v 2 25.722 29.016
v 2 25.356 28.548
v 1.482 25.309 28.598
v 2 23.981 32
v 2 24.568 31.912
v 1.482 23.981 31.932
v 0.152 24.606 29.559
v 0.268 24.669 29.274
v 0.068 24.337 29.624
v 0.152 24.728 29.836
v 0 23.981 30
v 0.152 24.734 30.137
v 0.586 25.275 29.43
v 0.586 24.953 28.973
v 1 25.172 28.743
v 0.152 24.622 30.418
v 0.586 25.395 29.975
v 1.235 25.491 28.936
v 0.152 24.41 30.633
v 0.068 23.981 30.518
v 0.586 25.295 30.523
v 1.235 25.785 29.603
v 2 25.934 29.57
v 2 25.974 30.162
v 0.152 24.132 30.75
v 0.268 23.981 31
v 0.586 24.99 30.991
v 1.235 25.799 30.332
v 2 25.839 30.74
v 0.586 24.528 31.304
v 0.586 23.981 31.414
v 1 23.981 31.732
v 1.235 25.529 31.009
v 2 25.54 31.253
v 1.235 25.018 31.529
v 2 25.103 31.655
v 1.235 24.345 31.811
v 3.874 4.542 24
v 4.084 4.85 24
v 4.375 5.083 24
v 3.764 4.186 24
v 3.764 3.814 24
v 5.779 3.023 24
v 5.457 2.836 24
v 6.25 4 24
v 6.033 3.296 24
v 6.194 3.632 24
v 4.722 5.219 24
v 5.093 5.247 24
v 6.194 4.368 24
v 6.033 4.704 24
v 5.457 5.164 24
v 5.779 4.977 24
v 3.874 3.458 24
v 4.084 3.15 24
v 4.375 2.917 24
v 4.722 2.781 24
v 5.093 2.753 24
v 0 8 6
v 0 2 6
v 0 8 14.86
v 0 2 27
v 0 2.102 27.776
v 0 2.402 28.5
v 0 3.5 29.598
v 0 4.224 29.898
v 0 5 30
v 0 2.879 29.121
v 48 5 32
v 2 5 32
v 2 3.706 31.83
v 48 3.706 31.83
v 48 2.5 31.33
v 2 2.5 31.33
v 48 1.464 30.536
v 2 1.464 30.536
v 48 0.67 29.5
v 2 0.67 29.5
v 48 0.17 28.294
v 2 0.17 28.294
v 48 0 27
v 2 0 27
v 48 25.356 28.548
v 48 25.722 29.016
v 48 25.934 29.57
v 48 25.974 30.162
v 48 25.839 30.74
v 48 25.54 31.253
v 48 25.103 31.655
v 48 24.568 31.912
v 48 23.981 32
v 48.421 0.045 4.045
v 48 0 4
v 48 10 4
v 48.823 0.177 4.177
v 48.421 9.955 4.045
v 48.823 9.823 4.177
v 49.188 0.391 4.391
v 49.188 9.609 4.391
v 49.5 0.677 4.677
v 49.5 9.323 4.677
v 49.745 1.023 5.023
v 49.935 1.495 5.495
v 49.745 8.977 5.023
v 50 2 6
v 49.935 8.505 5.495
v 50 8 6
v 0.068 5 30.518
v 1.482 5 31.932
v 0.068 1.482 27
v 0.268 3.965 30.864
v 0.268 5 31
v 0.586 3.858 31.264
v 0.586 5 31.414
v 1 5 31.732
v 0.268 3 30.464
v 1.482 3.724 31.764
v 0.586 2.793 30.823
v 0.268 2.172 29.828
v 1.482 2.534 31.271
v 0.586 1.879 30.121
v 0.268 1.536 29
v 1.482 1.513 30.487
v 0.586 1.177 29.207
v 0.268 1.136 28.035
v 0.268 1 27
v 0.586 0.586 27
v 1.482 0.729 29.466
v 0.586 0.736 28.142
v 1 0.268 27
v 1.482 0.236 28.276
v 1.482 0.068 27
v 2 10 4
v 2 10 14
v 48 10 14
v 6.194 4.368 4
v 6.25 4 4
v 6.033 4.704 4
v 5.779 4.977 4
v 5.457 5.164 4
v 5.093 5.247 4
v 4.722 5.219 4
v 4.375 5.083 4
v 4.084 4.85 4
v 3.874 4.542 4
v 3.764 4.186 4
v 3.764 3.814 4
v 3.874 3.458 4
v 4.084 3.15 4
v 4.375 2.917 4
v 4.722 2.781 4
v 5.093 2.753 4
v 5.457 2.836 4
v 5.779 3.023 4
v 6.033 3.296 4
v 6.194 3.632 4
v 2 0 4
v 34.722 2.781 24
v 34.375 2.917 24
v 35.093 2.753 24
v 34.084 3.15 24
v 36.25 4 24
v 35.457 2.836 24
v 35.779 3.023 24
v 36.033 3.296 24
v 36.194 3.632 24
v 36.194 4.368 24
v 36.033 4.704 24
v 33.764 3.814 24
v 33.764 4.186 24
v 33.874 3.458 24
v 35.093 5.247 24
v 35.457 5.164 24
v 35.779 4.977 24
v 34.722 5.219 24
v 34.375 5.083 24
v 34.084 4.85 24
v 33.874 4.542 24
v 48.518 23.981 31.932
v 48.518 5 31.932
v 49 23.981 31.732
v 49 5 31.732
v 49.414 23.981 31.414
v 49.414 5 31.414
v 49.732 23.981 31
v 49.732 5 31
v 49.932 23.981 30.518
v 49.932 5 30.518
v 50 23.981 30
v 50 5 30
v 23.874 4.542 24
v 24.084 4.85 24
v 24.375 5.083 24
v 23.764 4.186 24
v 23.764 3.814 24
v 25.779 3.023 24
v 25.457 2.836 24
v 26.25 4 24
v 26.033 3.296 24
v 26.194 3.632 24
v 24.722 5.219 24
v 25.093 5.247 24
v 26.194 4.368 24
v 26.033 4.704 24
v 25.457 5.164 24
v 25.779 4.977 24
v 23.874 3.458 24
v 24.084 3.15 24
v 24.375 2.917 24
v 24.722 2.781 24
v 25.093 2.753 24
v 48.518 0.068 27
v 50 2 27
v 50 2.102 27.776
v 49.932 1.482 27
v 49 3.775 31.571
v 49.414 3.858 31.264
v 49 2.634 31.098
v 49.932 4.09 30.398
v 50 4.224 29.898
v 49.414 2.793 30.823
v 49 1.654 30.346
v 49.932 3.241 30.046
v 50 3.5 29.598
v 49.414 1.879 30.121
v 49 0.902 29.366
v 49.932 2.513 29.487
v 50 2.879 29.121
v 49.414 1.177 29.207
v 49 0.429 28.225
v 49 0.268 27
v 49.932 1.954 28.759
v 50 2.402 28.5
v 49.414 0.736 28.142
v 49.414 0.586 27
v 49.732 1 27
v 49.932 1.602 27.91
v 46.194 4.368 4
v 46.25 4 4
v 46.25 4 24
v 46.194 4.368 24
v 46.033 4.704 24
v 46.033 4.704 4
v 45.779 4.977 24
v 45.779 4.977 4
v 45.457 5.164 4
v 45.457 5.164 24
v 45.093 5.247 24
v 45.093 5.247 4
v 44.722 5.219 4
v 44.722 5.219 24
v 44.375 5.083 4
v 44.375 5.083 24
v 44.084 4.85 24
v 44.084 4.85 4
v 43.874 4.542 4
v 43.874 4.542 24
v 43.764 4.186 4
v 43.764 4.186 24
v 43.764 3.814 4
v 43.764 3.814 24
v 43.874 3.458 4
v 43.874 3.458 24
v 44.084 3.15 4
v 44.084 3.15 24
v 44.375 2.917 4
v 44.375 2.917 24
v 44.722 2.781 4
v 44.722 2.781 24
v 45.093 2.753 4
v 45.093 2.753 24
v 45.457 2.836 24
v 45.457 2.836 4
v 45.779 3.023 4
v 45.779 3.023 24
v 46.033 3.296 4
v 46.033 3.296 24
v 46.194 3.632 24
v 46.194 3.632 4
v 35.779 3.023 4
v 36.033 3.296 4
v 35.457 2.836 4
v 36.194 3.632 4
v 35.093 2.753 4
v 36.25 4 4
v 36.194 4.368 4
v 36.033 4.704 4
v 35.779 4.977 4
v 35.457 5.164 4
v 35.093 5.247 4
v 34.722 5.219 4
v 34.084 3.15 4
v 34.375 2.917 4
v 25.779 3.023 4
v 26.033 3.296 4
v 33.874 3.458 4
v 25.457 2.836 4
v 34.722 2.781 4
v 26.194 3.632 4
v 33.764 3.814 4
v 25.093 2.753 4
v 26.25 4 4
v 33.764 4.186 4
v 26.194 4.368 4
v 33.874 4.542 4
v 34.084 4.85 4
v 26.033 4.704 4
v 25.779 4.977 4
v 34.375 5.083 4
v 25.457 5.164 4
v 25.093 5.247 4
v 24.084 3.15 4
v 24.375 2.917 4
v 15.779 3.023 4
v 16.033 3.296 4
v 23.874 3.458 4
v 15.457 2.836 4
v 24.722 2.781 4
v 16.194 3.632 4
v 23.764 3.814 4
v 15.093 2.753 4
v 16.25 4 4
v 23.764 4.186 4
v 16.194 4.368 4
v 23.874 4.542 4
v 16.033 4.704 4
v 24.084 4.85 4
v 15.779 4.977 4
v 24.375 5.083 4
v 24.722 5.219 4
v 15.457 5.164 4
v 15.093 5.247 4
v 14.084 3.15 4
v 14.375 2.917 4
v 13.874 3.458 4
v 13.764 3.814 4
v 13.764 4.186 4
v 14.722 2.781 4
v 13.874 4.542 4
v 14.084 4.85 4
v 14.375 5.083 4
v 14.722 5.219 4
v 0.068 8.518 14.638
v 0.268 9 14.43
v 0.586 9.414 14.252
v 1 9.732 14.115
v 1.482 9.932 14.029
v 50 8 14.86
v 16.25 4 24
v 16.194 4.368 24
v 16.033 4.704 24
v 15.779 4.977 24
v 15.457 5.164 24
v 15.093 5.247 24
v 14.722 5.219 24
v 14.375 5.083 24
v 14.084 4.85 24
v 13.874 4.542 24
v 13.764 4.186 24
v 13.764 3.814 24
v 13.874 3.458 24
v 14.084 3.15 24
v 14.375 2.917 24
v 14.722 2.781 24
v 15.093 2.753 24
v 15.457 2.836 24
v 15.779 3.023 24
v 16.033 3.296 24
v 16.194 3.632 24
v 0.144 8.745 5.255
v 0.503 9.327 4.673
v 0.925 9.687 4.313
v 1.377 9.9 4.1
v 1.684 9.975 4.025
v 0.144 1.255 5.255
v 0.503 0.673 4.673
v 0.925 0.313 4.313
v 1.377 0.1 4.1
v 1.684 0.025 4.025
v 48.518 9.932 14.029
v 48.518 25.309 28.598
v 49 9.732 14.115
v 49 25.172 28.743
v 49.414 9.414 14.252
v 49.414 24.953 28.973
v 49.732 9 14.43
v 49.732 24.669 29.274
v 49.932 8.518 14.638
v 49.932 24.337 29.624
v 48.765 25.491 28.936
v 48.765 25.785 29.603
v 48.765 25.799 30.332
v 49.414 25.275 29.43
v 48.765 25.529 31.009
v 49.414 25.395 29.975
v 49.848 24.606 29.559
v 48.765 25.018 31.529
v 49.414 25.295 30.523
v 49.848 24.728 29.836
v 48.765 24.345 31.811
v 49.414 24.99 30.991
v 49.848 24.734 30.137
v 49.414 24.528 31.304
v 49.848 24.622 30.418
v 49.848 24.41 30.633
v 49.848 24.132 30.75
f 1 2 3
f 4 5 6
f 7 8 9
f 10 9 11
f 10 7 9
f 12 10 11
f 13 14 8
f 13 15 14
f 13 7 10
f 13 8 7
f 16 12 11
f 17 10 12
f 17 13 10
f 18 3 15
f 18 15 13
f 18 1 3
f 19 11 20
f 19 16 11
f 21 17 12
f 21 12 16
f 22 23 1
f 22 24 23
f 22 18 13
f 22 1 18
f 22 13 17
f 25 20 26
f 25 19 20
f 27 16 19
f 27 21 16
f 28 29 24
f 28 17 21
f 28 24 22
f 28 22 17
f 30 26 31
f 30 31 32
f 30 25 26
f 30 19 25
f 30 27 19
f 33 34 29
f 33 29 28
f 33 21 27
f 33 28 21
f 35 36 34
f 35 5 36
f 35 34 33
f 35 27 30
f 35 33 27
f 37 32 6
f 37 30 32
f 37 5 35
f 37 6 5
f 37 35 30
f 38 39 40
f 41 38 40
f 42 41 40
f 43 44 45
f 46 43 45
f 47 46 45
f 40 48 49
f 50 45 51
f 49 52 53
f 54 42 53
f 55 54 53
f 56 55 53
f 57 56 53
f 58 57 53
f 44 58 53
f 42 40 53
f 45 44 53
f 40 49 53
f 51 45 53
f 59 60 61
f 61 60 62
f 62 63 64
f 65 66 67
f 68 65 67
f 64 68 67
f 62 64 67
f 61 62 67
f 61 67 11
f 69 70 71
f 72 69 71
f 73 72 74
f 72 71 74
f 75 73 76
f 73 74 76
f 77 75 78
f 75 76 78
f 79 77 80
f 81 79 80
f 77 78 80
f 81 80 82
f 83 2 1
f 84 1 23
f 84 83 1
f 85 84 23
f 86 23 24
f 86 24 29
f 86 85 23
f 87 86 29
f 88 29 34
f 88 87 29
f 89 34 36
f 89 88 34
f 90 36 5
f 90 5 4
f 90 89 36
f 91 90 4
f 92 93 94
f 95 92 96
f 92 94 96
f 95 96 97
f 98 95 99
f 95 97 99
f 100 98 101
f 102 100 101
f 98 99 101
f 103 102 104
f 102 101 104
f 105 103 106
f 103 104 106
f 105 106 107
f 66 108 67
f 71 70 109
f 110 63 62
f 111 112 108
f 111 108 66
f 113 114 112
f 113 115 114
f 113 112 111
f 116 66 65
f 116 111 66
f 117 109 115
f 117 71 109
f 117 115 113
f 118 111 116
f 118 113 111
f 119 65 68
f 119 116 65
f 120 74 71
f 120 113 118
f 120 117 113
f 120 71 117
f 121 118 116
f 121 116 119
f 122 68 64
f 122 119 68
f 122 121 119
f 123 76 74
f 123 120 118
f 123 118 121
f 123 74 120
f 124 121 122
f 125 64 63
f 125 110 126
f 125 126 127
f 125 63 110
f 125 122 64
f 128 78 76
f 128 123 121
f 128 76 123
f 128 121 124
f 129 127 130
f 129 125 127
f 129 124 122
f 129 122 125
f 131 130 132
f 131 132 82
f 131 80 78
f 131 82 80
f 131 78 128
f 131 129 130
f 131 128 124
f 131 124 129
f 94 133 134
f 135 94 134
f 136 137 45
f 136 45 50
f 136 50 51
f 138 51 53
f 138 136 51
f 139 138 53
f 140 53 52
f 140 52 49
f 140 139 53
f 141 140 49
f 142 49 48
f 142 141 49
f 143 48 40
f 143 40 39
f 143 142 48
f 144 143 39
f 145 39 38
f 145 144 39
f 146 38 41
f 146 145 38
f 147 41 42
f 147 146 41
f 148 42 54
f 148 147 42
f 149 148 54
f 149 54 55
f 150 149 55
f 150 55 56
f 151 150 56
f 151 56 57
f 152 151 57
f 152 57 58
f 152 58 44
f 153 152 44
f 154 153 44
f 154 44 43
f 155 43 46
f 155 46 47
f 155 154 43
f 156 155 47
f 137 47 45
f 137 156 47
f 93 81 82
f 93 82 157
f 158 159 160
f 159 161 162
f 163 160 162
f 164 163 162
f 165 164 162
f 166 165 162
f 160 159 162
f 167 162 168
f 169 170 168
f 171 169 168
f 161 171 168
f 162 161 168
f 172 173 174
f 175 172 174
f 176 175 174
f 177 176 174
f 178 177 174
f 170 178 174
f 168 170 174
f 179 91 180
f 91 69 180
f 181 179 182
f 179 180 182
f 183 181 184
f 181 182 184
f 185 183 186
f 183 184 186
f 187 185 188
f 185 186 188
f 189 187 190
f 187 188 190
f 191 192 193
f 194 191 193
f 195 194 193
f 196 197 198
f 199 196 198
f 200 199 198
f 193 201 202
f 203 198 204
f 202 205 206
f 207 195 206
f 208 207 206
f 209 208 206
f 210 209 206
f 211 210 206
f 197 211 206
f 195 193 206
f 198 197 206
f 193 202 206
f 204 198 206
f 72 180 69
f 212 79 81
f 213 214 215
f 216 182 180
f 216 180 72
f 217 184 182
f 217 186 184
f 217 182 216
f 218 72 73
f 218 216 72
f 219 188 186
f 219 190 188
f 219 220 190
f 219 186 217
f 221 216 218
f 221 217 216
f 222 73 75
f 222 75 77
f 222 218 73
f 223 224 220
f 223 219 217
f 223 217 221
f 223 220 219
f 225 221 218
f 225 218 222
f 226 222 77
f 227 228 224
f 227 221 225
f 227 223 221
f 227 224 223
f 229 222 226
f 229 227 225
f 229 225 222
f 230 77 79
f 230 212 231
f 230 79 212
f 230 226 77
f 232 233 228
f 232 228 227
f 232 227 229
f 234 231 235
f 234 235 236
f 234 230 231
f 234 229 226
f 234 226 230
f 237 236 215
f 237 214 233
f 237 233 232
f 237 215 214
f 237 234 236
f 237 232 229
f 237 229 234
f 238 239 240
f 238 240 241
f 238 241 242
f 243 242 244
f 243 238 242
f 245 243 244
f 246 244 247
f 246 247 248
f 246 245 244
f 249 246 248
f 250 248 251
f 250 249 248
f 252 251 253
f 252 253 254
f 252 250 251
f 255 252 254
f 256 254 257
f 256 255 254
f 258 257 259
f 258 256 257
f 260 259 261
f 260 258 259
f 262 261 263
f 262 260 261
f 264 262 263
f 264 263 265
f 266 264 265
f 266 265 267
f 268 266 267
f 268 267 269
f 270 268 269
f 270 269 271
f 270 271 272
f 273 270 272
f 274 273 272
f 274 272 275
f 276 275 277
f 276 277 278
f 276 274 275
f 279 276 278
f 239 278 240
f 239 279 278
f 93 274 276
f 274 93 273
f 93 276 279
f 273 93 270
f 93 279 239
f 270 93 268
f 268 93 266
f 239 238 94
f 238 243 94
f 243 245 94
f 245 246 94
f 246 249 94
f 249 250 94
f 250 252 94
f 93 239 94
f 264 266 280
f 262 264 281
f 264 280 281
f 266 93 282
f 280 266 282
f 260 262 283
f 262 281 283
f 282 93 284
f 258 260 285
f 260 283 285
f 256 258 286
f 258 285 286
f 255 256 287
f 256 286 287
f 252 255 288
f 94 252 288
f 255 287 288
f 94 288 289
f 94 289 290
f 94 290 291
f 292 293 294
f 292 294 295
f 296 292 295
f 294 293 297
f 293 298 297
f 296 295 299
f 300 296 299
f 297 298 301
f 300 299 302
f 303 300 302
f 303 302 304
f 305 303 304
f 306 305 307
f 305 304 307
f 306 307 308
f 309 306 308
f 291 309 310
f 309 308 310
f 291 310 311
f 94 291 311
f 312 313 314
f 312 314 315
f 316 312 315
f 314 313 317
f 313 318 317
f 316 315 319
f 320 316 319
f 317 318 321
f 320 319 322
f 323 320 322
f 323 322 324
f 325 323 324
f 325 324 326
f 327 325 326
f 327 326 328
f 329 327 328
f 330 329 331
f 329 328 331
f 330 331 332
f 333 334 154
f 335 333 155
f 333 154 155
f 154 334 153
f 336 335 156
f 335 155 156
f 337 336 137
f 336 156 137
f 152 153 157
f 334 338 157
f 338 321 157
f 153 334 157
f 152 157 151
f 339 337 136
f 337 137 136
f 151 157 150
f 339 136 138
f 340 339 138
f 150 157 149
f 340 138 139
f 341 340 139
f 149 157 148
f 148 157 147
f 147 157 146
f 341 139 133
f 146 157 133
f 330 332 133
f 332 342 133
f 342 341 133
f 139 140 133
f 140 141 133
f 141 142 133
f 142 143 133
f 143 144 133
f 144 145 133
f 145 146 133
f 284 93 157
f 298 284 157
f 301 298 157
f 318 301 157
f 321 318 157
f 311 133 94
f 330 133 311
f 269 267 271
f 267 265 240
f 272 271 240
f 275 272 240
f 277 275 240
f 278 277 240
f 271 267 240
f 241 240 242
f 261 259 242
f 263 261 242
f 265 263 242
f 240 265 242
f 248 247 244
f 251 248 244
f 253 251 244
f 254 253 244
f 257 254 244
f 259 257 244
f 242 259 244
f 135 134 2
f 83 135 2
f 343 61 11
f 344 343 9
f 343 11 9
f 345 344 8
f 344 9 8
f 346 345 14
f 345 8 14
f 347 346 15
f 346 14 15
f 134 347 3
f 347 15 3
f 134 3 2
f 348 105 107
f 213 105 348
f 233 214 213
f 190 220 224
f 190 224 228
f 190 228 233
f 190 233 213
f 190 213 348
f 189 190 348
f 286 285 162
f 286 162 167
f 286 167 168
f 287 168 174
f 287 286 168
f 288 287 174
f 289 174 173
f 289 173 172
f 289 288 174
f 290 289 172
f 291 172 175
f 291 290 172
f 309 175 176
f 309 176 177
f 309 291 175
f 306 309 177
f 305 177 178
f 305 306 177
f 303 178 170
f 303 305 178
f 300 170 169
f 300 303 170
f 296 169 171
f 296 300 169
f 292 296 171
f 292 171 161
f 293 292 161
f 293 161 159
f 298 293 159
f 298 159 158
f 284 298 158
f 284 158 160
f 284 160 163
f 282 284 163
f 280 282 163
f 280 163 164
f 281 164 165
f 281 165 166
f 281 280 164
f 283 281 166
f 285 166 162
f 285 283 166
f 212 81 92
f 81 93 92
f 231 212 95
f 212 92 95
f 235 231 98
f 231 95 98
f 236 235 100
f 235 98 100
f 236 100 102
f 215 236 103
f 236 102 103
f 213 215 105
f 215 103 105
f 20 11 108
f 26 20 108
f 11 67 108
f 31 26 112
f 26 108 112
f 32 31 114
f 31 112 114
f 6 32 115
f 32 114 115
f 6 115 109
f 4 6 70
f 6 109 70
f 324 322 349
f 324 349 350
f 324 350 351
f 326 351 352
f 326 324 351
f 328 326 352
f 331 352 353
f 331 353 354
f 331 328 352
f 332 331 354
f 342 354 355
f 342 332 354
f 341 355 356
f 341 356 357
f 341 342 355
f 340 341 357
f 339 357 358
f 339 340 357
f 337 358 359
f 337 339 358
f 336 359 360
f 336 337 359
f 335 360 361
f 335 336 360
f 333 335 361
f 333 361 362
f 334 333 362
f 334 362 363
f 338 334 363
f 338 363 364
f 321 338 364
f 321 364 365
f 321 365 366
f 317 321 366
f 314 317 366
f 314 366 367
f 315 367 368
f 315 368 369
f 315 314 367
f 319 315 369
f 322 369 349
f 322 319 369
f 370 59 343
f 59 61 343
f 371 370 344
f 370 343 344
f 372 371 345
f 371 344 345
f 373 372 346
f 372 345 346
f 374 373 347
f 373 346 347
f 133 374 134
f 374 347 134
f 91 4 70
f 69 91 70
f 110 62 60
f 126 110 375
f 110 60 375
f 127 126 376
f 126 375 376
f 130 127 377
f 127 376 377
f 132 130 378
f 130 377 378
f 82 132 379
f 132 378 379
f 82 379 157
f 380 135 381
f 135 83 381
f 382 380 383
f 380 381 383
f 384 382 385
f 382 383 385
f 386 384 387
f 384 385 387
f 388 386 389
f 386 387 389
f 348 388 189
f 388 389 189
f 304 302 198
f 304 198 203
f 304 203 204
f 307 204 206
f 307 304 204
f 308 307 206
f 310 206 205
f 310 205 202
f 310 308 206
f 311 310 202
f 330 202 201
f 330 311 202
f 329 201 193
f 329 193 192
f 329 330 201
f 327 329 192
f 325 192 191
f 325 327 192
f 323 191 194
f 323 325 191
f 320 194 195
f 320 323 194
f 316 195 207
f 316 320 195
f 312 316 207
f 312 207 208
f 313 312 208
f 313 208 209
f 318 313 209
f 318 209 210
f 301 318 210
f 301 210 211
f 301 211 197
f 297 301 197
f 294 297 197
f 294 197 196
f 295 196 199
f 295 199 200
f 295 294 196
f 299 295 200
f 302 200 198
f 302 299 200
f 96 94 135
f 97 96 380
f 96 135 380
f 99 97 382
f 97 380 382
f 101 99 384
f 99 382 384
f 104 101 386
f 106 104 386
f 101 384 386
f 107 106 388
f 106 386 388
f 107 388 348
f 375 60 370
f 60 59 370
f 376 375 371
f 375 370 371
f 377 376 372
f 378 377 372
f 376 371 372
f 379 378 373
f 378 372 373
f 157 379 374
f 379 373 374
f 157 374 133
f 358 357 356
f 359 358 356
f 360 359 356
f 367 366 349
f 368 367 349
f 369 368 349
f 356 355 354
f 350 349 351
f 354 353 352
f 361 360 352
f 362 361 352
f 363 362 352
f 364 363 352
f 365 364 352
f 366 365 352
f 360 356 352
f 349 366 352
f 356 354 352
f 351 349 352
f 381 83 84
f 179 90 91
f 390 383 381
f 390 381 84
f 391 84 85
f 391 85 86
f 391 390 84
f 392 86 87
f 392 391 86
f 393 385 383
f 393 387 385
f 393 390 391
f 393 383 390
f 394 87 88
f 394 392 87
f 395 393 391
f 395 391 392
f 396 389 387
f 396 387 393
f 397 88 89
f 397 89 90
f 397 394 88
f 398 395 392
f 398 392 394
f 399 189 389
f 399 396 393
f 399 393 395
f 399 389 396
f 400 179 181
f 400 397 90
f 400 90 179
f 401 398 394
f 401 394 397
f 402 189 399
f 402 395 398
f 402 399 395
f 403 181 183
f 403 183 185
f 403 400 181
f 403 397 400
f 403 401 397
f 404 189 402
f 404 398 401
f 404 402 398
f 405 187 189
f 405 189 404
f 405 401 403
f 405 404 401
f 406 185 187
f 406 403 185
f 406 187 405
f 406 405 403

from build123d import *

# Parameters (mm, degrees)
PAD002_DEPTH = 50
SKETCH005_R  = 1.25
POCKET_DEPTH = 20
FILLET_R     = 2
FILLET001_R  = 2


with BuildPart() as part:
    # Sketch002 → Pad002 (new body)
    with BuildSketch(Plane.YZ):
        with BuildLine():
            Line((0, 0), (10, 0))
            Line((10, 0), (10, 10))
            Line((10, 10), (29, 28))
            Line((29, 28), (5, 28))
            ThreePointArc((5, 28), (1.464466, 26.535534), (0, 23))
            Line((0, 23), (0, 0))
        make_face()
    extrude(amount=PAD002_DEPTH)

    # Sketch005 → Pocket (cut)
    with BuildSketch(Plane.XY):
        with Locations((5, 4)):
            Circle(SKETCH005_R)
        with Locations((15, 4)):
            Circle(SKETCH005_R)
        with Locations((25, 4)):
            Circle(SKETCH005_R)
        with Locations((35, 4)):
            Circle(SKETCH005_R)
        with Locations((45, 4)):
            Circle(SKETCH005_R)
    extrude(amount=POCKET_DEPTH, mode=Mode.SUBTRACT)

    # Fillet
    fillet_edges = [part.edges().sort_by_distance(p)[0] for p in [
        (25, 29, 28),
    ]]
    fillet(fillet_edges, radius=FILLET_R)

    # Fillet001
    fillet001_edges = [part.edges().sort_by_distance(p)[0] for p in [
        (50, 17.678161, 17.274047),
        (50, 25.838763, 26.740334),
        (50, 10, 5),
        (50, 14.490416, 28),
        (50, 5, 0),
        (50, 1.464466, 26.535534),
        (50, 0, 11.5),
        (0, 17.678161, 17.274047),
        (0, 25.838763, 26.740334),
        (0, 10, 5),
        (0, 14.490416, 28),
        (0, 5, 0),
        (0, 1.464466, 26.535534),
        (0, 0, 11.5),
    ]]
    fillet(fillet001_edges, radius=FILLET001_R)


with BuildPart() as part_1:
    # Body002 placement: moved
    add(part.part.moved(Location((0, 0, 4))))


solid = part_1.part
